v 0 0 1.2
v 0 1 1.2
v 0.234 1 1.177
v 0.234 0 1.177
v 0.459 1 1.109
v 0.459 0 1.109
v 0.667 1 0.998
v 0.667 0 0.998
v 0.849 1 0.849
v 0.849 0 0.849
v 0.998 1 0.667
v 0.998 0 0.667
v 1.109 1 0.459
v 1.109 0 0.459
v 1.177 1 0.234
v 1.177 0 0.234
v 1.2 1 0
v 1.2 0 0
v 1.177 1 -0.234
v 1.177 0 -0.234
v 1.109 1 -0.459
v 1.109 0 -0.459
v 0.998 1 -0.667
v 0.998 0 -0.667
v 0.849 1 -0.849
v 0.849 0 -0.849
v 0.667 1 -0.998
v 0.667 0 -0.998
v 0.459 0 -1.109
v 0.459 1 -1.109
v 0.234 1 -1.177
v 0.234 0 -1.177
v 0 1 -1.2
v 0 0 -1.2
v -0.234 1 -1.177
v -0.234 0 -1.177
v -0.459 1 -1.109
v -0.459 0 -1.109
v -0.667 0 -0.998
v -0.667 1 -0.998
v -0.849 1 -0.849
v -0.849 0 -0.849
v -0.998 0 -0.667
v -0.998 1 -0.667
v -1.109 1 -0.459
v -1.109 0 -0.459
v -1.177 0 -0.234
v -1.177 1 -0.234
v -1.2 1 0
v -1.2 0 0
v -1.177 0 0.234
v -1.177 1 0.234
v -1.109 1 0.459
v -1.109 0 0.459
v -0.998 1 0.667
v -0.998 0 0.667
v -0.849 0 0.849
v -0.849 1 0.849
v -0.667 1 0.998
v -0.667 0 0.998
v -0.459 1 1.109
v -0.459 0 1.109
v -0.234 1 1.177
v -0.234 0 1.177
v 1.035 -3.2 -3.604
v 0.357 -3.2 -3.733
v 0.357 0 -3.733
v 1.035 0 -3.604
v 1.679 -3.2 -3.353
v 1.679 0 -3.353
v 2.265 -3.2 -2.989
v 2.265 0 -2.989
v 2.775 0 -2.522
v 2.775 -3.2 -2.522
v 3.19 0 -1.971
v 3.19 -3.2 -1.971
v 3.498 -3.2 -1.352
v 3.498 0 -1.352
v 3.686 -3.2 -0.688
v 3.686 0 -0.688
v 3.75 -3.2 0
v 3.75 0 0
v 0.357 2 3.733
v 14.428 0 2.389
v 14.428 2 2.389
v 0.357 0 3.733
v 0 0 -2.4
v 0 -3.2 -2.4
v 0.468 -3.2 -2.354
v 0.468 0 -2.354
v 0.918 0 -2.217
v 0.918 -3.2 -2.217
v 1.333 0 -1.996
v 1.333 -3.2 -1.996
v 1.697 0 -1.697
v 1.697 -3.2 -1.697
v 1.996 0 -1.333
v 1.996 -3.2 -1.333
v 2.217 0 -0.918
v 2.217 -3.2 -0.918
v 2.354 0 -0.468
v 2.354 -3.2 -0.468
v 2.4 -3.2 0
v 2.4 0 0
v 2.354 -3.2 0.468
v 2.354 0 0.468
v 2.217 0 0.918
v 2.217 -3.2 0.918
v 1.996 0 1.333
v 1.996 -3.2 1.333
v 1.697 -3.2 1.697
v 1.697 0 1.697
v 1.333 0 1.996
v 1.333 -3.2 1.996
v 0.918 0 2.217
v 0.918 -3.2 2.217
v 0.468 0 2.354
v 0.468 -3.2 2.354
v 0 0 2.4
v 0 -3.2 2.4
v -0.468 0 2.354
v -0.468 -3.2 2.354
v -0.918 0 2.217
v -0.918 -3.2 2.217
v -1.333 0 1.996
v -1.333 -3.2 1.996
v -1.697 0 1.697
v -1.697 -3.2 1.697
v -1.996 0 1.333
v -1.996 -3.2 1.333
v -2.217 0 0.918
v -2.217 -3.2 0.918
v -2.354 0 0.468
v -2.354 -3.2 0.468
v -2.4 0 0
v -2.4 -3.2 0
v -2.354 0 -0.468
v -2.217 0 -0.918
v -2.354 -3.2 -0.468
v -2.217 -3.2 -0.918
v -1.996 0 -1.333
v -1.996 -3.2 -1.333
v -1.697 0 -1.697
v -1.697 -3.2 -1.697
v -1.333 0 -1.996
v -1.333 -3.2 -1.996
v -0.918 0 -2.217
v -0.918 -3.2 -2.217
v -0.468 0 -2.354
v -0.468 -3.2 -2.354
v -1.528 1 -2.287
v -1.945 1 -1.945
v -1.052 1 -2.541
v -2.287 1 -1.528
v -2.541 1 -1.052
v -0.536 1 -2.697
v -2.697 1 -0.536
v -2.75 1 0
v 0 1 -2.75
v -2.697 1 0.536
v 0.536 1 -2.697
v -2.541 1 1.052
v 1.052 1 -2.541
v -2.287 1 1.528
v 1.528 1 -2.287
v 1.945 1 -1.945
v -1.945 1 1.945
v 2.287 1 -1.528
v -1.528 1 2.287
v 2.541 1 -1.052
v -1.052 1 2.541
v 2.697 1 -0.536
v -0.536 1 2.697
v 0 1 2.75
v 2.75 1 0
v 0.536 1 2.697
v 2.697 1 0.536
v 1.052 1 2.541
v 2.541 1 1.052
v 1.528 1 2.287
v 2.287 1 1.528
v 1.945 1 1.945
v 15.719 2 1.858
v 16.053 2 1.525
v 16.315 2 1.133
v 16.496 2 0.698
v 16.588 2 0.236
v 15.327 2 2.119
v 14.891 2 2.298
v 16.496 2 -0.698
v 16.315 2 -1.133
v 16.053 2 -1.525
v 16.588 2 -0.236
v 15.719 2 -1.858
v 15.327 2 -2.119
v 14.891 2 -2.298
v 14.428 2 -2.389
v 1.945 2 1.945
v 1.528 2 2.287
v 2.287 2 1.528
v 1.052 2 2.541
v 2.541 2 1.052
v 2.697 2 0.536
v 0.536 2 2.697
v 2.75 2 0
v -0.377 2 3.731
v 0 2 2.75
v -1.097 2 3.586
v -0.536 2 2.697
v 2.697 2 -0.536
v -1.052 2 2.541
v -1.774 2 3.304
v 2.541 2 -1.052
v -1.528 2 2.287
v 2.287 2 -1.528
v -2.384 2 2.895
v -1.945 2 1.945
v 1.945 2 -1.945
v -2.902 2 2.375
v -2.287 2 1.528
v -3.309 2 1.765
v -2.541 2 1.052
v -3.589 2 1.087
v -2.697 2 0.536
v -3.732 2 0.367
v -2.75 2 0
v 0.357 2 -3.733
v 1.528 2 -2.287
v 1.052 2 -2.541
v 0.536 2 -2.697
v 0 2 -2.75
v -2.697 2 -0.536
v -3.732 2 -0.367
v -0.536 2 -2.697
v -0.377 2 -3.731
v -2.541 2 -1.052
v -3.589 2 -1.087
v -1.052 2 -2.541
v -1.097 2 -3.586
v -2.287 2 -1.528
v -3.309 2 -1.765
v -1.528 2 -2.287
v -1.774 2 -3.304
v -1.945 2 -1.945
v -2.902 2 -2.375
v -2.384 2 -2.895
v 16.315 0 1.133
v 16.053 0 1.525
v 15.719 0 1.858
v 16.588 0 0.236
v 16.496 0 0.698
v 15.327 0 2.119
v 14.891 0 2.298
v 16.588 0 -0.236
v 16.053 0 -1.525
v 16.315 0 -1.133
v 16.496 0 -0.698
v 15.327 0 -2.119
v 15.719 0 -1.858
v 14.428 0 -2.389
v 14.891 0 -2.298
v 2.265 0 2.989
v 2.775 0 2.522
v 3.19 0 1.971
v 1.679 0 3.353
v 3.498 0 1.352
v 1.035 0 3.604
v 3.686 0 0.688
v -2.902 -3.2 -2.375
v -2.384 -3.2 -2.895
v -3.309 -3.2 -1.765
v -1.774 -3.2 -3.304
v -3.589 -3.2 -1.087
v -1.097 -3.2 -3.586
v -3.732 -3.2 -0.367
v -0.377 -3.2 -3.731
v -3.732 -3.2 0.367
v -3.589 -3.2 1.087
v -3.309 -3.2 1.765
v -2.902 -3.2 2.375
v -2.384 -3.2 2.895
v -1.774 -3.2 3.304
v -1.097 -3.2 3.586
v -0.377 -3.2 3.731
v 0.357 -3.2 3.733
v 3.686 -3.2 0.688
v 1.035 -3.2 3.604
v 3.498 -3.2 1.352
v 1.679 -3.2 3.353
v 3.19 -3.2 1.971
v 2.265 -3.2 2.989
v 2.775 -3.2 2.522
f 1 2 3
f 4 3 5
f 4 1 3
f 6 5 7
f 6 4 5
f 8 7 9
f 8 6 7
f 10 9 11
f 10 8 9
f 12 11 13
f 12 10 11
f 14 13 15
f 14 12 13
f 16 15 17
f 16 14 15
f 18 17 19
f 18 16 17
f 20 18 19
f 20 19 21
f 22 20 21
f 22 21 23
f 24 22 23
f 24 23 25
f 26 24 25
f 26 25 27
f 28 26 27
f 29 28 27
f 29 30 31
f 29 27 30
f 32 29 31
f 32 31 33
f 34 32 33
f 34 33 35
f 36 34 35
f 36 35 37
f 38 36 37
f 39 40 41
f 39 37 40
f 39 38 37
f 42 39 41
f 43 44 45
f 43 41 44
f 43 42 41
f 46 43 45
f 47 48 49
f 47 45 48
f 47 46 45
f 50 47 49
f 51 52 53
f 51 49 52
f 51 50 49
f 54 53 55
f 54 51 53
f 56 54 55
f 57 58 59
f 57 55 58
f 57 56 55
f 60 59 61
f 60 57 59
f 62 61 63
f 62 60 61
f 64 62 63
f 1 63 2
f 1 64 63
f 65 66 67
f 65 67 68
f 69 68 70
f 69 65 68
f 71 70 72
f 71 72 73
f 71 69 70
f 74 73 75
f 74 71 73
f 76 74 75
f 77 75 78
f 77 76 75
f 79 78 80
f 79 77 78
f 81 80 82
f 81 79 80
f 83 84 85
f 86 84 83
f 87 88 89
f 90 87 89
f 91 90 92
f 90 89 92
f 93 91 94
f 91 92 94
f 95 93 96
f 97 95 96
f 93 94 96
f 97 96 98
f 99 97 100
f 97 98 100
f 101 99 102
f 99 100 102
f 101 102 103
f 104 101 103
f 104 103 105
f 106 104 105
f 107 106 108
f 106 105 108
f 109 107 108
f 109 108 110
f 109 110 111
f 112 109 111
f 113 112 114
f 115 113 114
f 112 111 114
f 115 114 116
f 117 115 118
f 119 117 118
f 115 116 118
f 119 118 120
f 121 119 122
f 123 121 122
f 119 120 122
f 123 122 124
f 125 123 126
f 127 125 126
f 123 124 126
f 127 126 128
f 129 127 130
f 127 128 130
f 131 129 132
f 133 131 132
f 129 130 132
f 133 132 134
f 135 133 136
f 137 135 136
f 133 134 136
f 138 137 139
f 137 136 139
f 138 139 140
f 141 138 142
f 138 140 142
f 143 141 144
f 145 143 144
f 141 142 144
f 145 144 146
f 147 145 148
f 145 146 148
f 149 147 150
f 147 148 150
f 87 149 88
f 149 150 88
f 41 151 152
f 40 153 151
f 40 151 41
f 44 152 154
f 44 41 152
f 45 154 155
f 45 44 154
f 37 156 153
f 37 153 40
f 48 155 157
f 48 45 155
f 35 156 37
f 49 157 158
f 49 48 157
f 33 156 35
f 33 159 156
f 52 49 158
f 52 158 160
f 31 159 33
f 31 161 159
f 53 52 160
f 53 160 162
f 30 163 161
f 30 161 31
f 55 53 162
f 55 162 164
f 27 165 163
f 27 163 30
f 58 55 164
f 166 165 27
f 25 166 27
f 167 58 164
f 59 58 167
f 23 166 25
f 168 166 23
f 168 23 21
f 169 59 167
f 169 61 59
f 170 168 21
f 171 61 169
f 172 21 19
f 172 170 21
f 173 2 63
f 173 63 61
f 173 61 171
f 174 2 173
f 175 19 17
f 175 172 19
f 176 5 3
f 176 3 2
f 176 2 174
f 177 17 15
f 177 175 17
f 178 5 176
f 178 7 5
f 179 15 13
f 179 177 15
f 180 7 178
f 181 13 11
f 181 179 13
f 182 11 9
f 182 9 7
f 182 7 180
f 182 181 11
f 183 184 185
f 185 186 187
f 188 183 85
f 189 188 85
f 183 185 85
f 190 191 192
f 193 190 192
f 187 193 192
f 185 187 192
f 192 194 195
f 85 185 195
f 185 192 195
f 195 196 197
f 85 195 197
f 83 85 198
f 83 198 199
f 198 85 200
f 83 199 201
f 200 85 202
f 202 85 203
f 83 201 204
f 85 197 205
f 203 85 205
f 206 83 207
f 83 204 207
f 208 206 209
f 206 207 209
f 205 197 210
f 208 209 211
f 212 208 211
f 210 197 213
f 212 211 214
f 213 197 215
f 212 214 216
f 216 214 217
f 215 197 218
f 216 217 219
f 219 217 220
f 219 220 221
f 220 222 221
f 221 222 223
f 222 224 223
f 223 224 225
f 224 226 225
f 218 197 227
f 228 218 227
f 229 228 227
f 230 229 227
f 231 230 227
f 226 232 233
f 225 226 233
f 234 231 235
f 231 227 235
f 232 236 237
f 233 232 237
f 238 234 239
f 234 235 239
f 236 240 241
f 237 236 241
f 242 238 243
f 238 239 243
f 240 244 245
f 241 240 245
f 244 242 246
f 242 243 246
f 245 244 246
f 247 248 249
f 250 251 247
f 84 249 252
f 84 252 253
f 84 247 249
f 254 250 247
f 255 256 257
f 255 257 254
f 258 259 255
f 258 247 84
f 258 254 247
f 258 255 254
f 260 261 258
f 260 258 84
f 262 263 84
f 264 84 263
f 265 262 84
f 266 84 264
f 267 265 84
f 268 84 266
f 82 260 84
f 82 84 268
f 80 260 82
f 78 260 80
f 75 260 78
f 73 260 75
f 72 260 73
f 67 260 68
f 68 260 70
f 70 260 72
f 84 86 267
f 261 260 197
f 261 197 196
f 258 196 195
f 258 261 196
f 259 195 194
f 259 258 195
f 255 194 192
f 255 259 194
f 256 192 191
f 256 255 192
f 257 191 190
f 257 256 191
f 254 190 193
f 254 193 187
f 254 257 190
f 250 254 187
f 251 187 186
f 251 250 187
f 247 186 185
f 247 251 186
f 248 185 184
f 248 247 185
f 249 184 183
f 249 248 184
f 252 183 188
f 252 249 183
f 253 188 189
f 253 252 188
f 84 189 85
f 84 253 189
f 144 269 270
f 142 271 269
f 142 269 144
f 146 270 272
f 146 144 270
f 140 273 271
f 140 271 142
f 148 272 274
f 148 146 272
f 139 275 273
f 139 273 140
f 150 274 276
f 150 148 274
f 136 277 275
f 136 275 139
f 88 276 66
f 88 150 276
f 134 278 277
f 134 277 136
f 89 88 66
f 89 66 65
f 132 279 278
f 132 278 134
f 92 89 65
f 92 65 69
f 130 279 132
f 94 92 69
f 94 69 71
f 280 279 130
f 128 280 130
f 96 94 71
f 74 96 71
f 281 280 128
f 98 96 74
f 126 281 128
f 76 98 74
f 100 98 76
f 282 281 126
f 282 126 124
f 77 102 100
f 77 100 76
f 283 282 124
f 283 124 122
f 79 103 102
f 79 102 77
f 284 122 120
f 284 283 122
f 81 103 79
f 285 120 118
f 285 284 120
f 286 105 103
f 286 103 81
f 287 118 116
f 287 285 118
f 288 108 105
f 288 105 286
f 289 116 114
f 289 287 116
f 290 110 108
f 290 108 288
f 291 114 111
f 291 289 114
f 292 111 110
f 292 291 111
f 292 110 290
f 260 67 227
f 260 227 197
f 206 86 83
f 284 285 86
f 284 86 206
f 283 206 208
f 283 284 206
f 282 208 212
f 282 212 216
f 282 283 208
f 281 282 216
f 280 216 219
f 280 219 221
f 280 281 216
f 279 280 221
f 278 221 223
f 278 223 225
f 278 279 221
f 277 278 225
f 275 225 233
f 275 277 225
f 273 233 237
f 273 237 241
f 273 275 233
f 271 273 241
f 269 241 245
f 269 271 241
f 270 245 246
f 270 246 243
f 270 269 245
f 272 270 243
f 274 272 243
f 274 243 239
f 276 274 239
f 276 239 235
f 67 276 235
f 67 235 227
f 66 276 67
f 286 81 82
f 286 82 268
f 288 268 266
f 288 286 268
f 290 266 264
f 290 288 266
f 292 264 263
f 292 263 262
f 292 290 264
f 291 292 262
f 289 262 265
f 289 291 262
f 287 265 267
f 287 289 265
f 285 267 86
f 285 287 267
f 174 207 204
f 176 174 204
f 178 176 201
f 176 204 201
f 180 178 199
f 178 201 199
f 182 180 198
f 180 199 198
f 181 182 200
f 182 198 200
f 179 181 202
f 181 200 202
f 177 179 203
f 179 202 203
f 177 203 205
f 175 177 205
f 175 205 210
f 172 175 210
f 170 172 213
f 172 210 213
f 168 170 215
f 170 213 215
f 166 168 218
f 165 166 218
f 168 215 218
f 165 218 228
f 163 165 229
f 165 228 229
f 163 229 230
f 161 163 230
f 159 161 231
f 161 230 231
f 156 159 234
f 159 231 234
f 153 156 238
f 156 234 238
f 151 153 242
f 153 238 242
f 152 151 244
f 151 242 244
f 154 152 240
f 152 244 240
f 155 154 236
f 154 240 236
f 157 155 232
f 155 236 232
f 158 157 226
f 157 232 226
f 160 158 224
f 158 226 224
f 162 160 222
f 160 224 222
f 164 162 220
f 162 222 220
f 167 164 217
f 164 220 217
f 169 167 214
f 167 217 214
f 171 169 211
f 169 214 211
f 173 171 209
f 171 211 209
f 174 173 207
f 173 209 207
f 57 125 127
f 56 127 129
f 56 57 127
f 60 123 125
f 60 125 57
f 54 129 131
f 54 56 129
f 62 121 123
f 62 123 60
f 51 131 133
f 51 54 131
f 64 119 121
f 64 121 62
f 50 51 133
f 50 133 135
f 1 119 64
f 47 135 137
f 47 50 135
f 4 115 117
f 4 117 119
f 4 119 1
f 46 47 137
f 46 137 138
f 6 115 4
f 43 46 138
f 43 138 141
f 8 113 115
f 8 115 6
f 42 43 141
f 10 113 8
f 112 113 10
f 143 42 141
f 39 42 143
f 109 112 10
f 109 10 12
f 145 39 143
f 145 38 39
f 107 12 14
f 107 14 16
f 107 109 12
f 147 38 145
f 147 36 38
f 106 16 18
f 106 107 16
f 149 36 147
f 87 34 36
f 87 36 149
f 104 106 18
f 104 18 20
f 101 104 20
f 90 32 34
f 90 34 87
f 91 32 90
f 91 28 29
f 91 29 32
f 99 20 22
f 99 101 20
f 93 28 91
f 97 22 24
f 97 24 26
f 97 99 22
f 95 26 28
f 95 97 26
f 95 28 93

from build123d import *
from build123d.topology import SkipClean

# Parameters (mm, degrees)
SKETCH1_R           = 1.2
BOSS_EXTRUDE1_DEPTH = 2
BOSS_EXTRUDE2_START = 3.2
SKETCH2_R           = 1.2
BOSS_EXTRUDE2_DEPTH = 3.2
SKETCH3_R           = 2.4
CUT_EXTRUDE3_DEPTH  = 3.2
SKETCH4_R           = 2.75
CUT_EXTRUDE4_DEPTH  = 1


with BuildPart() as part:
    # Sketch1 → Boss-Extrude1 (new body)
    with BuildSketch(Plane(origin=(0, 0, 0), x_dir=(1, 0, 0), z_dir=(0, 1, 0))):
        with BuildLine():
            Line((0.356514085, 3.73301456), (14.428169014, 2.389129319))
            ThreePointArc((14.428169014, 2.389129319), (16.6, 0), (14.428169014, -2.389129319))
            Line((14.428169014, -2.389129319), (0.356514085, -3.73301456))
            ThreePointArc((0.356514085, -3.73301456), (-3.75, 0), (0.356514085, 3.73301456))
        make_face()
        with Locations(Location((0, 0, 0), (0, 0, 270))):
            Circle(SKETCH1_R, mode=Mode.SUBTRACT)
    extrude(amount=BOSS_EXTRUDE1_DEPTH)

    # Sketch2 → Boss-Extrude2 (add)
    with SkipClean():  # the faces are left unmerged after this step: merging them gives an invalid solid
        with BuildSketch(Plane.XZ.offset(BOSS_EXTRUDE2_START)):
            with BuildLine():
                ThreePointArc((3.75, 0), (2.774835835, 2.522456361), (0.356514085, 3.73301456))
                ThreePointArc((0.356514085, 3.73301456), (-3.75, 0), (0.356514085, -3.73301456))
                ThreePointArc((0.356514085, -3.73301456), (2.774835835, -2.522456361), (3.75, 0))
            make_face()
            with Locations(Location((0, 0, 0), (0, 0, 270))):
                Circle(SKETCH2_R, mode=Mode.SUBTRACT)
        extrude(amount=-BOSS_EXTRUDE2_DEPTH)

    # Sketch3 → Cut-Extrude3 (cut)
    with BuildSketch(Plane.XZ.offset(3.2)):
        with Locations(Location((0, 0, 0), (0, 0, 270))):
            Circle(SKETCH3_R)
    extrude(amount=-CUT_EXTRUDE3_DEPTH, mode=Mode.SUBTRACT)

    # Sketch4 → Cut-Extrude4 (cut)
    with BuildSketch(Plane(origin=(0, 2, 0), x_dir=(1, 0, 0), z_dir=(0, 1, 0))):
        with Locations(Location((0, 0, 0), (0, 0, 270))):
            Circle(SKETCH4_R)
    extrude(amount=-CUT_EXTRUDE4_DEPTH, mode=Mode.SUBTRACT)


solid = part.part
